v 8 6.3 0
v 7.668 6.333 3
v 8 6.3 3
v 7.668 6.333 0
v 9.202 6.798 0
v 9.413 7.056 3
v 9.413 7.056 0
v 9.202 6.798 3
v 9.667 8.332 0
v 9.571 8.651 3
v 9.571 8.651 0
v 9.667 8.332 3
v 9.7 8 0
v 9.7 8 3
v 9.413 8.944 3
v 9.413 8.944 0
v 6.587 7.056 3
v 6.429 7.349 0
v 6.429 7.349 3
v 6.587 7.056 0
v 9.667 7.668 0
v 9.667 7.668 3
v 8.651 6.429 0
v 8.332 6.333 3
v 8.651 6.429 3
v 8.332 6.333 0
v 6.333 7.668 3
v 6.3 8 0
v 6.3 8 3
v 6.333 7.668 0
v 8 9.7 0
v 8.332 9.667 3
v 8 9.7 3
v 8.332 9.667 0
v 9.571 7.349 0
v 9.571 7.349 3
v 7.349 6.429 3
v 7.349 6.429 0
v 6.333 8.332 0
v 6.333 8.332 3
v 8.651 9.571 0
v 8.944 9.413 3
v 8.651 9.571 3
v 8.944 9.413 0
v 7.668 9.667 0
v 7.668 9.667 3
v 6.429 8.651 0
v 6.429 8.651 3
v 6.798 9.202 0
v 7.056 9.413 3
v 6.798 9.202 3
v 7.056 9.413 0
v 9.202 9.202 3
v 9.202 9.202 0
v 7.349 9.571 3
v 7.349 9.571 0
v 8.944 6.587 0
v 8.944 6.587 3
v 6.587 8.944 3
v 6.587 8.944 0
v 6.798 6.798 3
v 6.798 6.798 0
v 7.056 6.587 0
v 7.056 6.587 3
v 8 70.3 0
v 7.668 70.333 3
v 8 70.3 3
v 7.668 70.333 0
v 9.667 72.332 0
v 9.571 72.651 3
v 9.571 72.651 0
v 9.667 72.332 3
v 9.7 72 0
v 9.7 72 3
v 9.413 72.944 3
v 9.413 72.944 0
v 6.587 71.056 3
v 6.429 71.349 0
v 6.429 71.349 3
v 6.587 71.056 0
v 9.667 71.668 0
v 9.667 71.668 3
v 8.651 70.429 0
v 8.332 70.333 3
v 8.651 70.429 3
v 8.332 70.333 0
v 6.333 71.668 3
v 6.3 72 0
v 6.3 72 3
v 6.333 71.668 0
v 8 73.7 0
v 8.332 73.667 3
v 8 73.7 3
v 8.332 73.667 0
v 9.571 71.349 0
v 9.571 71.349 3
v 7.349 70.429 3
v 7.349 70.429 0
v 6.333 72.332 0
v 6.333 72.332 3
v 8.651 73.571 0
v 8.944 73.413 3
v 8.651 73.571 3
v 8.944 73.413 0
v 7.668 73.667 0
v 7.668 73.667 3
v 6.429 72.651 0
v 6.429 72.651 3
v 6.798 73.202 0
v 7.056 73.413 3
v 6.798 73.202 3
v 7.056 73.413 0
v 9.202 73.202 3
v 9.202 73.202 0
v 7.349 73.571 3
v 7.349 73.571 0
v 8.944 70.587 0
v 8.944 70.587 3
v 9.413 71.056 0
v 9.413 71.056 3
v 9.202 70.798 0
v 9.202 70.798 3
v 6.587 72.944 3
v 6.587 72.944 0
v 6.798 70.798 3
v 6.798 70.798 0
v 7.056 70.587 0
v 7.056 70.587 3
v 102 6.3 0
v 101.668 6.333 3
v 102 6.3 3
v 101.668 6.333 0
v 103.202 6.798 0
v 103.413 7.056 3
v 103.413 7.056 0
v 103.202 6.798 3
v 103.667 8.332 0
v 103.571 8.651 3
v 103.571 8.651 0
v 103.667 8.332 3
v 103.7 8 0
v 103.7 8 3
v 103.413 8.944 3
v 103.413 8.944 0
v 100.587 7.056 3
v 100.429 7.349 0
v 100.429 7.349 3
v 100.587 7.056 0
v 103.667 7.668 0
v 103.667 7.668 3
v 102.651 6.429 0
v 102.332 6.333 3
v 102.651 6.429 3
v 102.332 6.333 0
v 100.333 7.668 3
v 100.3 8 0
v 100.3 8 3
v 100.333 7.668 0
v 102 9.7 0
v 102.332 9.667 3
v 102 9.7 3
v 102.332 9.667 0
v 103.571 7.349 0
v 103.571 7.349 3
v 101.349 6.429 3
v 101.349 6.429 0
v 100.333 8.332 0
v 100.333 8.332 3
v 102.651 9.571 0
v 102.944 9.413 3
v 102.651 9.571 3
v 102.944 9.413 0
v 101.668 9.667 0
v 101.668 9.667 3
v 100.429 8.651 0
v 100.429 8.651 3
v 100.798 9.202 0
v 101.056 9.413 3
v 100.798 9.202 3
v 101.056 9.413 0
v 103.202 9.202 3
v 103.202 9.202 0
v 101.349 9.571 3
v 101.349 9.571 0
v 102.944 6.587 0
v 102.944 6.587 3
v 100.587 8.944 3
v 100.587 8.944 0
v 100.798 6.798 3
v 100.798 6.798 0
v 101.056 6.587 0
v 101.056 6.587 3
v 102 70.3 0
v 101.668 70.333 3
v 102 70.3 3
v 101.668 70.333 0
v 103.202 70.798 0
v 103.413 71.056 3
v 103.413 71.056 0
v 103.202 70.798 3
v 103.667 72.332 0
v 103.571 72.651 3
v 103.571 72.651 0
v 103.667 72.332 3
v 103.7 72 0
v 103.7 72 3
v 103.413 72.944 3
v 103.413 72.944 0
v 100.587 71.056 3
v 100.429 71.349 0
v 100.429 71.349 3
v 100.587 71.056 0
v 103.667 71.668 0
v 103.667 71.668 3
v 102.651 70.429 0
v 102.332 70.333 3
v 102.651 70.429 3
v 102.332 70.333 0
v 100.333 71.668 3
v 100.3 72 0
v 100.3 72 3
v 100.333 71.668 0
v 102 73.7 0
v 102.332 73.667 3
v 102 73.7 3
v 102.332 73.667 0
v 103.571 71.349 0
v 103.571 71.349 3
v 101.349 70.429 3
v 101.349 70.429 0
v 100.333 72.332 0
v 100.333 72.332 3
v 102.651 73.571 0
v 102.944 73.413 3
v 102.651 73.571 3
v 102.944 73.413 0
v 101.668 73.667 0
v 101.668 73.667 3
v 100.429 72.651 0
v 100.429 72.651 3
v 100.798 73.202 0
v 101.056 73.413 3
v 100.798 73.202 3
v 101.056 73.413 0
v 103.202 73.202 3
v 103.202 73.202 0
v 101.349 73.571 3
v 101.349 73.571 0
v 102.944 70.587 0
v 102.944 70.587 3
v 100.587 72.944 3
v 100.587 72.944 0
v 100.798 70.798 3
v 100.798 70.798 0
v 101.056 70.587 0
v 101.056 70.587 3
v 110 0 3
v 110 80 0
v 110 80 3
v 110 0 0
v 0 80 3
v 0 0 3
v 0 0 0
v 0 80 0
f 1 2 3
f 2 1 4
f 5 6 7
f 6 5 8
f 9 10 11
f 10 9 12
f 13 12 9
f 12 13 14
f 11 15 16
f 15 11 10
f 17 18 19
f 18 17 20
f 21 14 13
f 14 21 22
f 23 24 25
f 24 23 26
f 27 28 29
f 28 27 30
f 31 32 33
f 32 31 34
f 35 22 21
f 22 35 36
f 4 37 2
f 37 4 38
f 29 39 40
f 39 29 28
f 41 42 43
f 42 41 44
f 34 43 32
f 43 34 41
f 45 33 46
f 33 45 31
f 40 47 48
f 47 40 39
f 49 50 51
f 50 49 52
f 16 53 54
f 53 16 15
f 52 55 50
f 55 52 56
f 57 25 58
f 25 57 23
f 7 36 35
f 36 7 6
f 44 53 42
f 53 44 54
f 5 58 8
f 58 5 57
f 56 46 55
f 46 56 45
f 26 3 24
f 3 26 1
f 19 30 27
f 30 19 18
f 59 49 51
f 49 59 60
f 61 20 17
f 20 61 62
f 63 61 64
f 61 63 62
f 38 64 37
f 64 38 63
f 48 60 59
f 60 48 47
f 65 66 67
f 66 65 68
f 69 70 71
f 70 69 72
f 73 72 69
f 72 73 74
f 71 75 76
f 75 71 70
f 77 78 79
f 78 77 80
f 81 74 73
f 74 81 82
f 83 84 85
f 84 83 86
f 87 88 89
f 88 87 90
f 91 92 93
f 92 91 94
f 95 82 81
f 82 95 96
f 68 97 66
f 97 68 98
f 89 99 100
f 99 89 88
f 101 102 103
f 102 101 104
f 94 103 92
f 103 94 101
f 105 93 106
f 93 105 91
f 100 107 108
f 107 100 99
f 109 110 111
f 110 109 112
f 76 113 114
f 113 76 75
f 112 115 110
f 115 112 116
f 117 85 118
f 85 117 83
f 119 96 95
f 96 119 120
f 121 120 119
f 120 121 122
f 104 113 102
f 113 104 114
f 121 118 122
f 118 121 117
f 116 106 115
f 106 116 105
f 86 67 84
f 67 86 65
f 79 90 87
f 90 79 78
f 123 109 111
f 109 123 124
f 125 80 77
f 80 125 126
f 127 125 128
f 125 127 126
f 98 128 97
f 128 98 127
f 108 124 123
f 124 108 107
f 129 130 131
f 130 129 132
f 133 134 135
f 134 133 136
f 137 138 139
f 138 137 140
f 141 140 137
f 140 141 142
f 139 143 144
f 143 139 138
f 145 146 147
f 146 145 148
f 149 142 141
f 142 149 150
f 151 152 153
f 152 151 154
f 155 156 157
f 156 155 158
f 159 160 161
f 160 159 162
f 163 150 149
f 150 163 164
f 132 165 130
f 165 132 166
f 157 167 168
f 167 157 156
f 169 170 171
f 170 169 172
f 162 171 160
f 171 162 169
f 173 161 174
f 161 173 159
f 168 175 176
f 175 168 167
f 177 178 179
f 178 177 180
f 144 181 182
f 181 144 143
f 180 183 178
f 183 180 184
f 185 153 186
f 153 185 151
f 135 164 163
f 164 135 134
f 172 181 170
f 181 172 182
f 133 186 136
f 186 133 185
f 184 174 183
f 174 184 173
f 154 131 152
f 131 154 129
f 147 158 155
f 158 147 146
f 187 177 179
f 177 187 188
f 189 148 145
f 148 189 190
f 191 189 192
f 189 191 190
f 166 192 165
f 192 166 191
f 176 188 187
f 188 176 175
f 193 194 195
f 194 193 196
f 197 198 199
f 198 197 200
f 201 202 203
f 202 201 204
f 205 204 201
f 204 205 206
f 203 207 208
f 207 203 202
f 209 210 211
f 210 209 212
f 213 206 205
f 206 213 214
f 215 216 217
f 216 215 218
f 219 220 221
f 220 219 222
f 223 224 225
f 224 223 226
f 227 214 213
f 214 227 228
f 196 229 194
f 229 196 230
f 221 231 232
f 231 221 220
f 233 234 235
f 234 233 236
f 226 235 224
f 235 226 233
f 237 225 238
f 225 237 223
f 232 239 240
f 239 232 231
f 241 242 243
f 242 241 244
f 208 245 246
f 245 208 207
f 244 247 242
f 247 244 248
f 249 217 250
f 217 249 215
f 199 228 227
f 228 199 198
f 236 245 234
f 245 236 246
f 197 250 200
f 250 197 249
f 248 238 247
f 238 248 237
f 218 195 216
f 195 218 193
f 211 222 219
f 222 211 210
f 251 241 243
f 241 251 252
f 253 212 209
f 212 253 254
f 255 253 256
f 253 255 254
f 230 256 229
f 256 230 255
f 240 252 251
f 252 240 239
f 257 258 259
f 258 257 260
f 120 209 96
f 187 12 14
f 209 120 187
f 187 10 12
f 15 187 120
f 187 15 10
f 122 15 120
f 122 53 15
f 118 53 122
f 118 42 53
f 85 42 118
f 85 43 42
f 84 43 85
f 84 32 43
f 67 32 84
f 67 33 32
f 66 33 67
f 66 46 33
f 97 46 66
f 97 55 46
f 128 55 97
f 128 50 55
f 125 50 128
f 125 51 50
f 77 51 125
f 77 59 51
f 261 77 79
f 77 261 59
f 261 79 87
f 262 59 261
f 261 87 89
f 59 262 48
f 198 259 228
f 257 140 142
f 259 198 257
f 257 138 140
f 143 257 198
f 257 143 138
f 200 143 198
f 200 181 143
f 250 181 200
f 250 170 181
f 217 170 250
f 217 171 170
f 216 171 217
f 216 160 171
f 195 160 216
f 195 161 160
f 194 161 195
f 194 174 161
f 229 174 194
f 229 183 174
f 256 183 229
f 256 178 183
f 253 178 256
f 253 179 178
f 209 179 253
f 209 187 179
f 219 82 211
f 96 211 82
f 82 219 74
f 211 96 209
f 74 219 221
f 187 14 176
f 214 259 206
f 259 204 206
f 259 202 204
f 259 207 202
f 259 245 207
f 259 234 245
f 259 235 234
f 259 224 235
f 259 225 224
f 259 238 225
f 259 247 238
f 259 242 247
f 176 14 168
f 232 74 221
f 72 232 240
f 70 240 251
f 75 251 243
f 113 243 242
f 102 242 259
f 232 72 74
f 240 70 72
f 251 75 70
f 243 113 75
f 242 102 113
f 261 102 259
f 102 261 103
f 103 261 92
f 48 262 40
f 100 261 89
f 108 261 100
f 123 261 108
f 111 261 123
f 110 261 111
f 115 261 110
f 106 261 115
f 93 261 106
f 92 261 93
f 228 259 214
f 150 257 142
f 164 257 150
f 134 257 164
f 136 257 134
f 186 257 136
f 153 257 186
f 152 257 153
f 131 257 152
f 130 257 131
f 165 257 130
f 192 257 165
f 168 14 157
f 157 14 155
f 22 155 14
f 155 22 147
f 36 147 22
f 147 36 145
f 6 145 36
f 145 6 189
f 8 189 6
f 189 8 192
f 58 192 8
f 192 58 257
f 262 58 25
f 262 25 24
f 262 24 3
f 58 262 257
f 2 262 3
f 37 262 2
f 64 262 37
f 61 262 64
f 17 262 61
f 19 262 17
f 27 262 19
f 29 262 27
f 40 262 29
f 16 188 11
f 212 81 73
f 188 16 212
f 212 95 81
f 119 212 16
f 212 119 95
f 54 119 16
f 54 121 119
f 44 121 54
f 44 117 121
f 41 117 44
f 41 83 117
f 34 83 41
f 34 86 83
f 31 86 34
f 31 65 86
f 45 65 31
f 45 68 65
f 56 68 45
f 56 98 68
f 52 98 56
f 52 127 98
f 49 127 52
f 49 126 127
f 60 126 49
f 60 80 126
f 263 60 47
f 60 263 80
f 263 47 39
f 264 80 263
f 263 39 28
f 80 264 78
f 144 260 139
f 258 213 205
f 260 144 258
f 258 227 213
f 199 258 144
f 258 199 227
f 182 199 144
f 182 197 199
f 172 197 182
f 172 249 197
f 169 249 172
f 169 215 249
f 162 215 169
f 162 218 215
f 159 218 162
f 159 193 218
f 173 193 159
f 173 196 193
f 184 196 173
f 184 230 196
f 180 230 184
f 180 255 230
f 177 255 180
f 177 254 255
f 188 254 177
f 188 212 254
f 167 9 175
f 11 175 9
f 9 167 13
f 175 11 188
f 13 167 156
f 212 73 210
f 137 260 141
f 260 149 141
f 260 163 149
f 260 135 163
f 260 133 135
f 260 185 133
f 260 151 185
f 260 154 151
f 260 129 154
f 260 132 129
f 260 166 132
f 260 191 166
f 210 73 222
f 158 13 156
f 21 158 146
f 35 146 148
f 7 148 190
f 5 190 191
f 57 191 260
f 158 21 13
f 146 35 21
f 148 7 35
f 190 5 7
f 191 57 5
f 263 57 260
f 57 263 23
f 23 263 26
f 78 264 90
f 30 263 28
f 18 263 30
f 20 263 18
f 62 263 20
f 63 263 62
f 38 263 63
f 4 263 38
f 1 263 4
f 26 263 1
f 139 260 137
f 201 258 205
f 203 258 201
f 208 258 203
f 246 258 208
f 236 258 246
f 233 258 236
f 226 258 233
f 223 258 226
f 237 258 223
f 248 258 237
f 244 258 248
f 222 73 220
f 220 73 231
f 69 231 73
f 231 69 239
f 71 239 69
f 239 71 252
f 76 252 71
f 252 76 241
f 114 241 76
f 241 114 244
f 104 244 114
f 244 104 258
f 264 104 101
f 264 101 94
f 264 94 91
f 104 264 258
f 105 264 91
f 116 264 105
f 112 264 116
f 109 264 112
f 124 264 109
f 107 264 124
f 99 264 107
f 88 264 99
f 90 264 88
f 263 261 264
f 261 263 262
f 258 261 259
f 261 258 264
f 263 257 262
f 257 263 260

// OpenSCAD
// ModuDeck donor chassis study: NOT a verified ThinkPad fit.
// Millimetres. 370x240 is an unconfirmed owner measurement.
$fn=32; W=370; D=240; t=3;
module plate(w,d,h){cube([w,d,h]);}
module shell(w,d,h){difference(){cube([w,d,h]);translate([t,t,t])cube([w-2*t,d-2*t,h]);}}
module hole(x,y,h){translate([x,y,-1])cylinder(d=3.4,h=h+2);}
module rail(n){difference(){cube([n,12,6]);for(x=[10:20:n-10])hole(x,6,6);}}
module rear(){difference(){cube([W-6,3,25]);translate([W/2-23,-1,6])cube([40,5,14]);for(x=[10,W-16])translate([x,-1,12])rotate([-90,0,0])cylinder(d=3.4,h=5);}}
module tray(){difference(){shell(W,D,30);translate([3,D-4,3])cube([W-6,6,27]);for(x=[15,W-15],y=[15,D-15])hole(x,y,30);}}
difference(){cube([110,80,3]);for(x=[8,102],y=[8,72])hole(x,y,3);}
